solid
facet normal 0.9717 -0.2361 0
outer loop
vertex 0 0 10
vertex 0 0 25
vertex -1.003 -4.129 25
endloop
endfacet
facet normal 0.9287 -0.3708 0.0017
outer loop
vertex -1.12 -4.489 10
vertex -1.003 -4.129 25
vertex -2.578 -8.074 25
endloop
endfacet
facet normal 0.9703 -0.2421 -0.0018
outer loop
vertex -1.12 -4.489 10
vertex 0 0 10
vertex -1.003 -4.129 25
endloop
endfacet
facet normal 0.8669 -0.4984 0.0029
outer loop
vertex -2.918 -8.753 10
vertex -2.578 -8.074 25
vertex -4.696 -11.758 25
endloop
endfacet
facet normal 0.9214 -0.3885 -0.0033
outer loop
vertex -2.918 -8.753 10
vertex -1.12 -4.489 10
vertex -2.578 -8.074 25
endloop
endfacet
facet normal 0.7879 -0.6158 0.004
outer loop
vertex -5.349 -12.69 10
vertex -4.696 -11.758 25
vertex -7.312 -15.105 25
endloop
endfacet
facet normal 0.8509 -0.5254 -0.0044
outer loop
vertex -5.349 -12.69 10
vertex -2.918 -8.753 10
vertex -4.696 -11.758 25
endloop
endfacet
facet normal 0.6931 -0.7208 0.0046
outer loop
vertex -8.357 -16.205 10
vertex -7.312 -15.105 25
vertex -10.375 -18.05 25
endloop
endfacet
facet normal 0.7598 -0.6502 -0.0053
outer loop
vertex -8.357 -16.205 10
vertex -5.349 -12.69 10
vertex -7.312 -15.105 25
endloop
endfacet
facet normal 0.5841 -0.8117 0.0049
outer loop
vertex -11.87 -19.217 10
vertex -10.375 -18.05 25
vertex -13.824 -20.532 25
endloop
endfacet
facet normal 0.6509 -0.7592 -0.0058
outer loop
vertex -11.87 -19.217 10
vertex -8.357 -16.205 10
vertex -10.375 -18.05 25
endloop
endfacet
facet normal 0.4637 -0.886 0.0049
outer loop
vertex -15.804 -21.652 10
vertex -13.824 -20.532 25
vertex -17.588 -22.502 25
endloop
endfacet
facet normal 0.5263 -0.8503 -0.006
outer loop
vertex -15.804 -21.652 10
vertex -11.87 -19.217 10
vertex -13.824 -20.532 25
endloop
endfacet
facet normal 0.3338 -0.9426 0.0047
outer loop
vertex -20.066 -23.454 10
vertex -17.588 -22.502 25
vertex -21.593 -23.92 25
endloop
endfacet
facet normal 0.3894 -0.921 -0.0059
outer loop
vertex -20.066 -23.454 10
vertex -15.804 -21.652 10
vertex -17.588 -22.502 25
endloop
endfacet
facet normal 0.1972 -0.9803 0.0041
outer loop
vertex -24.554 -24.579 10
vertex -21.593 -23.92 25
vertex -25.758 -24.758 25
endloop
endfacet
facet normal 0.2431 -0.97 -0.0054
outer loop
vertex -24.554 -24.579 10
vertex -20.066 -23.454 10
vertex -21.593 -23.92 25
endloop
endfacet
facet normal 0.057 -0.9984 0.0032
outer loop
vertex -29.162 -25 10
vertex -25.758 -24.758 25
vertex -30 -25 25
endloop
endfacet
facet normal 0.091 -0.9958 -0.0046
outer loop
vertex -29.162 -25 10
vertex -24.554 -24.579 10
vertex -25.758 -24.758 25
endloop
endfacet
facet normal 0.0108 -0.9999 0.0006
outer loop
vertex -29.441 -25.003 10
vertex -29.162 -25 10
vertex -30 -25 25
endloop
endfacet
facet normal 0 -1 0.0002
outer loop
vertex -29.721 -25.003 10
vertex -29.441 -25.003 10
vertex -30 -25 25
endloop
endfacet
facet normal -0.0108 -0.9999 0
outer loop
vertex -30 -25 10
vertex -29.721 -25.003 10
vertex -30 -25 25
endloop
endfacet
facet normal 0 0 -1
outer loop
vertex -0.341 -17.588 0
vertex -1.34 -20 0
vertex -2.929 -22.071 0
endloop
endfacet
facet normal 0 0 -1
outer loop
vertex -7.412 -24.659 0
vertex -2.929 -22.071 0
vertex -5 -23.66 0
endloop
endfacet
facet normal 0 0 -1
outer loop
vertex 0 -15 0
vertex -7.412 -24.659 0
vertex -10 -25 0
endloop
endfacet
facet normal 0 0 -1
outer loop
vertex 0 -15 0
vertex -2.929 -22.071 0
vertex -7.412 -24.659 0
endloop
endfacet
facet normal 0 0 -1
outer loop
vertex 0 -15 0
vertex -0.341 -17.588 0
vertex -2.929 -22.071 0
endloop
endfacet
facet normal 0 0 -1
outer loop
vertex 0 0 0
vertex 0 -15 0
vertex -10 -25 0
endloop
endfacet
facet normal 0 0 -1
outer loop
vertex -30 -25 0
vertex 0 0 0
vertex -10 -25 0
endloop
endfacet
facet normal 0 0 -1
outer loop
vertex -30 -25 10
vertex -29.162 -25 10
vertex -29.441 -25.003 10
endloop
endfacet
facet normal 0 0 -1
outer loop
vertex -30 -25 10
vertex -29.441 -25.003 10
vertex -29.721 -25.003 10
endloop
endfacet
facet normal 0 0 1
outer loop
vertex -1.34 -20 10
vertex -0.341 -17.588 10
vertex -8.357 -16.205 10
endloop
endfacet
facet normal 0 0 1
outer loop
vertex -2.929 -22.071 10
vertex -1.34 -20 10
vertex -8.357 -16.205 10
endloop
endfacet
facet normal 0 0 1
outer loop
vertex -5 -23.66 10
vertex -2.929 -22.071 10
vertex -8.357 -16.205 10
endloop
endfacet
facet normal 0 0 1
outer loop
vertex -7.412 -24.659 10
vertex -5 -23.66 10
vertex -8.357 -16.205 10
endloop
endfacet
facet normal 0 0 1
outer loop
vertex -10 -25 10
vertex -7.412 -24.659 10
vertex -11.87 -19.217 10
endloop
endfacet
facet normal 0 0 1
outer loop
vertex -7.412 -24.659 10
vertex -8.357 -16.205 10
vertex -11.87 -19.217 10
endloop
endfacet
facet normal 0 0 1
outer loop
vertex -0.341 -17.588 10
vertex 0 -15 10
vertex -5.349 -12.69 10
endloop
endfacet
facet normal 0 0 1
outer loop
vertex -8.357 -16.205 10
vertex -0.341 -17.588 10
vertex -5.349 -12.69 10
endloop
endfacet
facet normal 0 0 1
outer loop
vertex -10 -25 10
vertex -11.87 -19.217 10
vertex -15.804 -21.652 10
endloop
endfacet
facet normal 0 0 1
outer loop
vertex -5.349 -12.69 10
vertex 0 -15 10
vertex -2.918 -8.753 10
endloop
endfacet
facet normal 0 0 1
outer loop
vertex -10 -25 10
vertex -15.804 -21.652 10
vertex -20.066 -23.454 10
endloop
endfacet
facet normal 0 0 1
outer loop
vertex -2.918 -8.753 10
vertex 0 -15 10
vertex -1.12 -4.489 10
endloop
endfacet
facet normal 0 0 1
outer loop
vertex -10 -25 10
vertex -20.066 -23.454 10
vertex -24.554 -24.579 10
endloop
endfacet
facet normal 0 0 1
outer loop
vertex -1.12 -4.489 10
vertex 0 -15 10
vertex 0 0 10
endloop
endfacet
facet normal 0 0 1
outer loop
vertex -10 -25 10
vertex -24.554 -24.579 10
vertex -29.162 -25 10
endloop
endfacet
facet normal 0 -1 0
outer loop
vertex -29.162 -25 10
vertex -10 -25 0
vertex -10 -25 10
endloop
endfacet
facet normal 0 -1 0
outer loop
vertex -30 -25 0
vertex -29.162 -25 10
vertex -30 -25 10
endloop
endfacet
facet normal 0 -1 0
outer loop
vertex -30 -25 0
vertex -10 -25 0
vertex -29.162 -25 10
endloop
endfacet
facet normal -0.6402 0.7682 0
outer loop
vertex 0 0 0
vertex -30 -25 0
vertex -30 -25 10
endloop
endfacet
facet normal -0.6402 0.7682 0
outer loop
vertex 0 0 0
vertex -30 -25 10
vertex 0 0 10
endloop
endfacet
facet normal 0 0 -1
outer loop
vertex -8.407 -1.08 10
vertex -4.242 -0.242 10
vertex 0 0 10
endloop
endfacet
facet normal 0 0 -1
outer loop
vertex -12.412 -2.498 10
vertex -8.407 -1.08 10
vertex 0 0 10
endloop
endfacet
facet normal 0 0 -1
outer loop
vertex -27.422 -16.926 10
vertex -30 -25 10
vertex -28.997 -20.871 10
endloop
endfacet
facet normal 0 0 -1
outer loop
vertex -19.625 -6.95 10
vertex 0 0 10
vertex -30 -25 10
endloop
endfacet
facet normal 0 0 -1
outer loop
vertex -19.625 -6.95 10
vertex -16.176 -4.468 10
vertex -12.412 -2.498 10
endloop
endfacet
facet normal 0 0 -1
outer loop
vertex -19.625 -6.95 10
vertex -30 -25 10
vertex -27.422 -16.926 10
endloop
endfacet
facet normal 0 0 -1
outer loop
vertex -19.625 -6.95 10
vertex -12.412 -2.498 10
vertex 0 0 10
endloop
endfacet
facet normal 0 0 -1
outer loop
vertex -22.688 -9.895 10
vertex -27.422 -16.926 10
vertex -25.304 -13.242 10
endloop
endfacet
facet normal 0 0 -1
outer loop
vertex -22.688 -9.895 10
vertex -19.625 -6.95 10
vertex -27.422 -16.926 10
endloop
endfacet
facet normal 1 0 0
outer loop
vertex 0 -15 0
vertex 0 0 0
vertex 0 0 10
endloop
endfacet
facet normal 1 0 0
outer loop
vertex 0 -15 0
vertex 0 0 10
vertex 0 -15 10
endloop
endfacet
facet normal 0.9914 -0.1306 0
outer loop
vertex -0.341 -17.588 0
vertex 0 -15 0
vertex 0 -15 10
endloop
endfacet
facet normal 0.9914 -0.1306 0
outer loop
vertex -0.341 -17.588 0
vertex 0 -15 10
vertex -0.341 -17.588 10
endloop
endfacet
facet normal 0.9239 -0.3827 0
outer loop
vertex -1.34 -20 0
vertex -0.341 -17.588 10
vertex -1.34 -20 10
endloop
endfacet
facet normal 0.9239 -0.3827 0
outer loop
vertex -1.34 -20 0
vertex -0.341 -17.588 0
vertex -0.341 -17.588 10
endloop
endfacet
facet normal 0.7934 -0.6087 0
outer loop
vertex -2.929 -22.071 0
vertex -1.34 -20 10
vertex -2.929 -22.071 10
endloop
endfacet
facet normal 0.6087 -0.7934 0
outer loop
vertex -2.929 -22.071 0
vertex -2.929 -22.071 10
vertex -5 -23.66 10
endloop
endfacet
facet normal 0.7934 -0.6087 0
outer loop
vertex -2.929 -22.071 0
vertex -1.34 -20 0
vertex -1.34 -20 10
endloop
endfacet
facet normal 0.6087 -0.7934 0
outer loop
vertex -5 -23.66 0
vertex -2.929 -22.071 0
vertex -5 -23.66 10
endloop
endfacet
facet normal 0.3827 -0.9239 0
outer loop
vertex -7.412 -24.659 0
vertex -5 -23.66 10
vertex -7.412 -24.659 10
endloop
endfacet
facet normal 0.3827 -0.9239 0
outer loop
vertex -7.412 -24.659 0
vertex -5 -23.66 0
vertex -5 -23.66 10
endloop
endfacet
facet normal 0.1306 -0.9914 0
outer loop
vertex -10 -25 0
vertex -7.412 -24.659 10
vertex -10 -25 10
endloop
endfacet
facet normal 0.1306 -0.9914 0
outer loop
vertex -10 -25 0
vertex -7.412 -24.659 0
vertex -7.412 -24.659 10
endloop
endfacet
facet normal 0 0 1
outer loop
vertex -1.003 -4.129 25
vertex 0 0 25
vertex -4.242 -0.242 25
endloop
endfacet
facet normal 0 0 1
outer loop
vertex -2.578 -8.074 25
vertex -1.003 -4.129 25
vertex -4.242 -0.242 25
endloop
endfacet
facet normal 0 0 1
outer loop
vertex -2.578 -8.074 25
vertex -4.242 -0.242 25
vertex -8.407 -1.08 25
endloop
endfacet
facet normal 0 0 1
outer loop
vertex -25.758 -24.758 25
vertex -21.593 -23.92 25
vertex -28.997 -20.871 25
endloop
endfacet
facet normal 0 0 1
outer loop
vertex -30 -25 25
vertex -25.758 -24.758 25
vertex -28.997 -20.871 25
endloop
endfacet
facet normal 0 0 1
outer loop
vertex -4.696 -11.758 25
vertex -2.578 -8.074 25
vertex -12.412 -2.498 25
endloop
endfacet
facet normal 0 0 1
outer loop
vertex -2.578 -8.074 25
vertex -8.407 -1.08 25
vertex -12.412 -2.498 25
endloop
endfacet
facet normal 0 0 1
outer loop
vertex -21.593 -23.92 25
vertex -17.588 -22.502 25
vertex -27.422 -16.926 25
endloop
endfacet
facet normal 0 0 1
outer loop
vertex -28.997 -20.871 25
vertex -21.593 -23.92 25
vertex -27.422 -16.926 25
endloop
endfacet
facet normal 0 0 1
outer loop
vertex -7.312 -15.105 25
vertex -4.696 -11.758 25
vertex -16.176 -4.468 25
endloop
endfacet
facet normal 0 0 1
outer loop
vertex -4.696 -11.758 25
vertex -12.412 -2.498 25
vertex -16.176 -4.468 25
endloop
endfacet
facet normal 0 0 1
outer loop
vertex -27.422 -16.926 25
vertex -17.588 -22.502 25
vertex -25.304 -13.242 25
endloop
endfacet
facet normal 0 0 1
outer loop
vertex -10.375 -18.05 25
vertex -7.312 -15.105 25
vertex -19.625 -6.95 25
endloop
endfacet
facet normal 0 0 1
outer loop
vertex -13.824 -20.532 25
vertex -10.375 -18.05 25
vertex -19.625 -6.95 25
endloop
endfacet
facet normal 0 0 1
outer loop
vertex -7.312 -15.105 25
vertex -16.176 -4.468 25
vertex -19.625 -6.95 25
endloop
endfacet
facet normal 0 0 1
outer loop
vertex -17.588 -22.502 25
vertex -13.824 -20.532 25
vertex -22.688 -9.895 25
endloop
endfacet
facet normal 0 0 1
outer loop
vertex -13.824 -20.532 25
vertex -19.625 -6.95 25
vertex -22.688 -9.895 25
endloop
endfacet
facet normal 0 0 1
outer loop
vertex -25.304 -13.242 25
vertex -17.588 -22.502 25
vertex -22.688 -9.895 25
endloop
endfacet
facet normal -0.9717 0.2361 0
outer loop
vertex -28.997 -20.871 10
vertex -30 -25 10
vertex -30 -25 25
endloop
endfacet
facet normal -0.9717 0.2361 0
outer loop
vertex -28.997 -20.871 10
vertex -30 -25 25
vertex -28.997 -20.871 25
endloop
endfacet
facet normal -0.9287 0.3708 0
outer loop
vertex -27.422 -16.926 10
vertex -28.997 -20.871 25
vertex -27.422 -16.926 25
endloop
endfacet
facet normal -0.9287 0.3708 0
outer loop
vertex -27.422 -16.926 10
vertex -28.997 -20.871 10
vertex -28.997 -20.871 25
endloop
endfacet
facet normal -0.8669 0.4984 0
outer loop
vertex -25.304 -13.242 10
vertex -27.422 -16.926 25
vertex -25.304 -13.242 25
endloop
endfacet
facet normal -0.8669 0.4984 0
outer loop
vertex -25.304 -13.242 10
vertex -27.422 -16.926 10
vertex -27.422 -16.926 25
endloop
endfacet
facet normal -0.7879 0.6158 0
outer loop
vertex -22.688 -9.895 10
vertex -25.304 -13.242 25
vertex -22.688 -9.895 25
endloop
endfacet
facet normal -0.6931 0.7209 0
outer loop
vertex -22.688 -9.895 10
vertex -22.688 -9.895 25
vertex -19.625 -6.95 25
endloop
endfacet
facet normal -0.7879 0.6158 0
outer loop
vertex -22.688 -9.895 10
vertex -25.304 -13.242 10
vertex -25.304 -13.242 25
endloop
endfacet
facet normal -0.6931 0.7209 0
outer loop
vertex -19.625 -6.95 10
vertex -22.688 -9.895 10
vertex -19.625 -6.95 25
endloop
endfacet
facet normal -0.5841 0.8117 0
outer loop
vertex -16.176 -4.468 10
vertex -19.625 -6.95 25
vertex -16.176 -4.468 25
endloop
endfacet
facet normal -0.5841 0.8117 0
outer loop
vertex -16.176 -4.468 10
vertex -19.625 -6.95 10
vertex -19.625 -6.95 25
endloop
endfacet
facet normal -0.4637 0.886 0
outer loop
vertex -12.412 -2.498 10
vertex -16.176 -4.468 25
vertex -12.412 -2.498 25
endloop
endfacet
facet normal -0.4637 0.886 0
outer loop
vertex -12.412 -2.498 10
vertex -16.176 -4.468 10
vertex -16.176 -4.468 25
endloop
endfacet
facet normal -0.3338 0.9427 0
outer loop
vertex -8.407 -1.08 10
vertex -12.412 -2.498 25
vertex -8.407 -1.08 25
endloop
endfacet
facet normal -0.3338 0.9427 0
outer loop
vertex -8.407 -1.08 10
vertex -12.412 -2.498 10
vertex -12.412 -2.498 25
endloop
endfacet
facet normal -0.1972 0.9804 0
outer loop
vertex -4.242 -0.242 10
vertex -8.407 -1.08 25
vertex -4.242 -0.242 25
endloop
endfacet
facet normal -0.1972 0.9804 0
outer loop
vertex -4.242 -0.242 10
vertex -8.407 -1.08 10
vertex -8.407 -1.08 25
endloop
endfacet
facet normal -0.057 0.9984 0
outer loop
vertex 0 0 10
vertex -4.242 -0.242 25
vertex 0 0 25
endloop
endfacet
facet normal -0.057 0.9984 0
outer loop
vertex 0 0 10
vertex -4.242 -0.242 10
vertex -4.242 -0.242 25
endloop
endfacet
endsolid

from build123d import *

# Parameters (mm, degrees)
BOSS_EXTRUDE1_DEPTH = 10
BOSS_EXTRUDE2_DEPTH = 15


with BuildPart() as part:
    # Sketch1 → Boss-Extrude1 (new body)
    with BuildSketch(Plane.XY):
        with BuildLine():
            Line((-30, -25), (0, 0))
            Line((0, 0), (0, -15))
            ThreePointArc((0, -15), (-2.928932188, -22.071067812), (-10, -25))
            Line((-10, -25), (-30, -25))
        make_face()
    extrude(amount=BOSS_EXTRUDE1_DEPTH)

    # Sketch3 → Boss-Extrude2 (add)
    with BuildSketch(Plane.XY.offset(10)):
        with BuildLine():
            ThreePointArc((-30, -25), (-19.624638361, -6.950433967), (0, 0))
            ThreePointArc((0, 0), (-10.375361639, -18.049566033), (-30, -25))
        make_face()
    extrude(amount=BOSS_EXTRUDE2_DEPTH)


solid = part.part
